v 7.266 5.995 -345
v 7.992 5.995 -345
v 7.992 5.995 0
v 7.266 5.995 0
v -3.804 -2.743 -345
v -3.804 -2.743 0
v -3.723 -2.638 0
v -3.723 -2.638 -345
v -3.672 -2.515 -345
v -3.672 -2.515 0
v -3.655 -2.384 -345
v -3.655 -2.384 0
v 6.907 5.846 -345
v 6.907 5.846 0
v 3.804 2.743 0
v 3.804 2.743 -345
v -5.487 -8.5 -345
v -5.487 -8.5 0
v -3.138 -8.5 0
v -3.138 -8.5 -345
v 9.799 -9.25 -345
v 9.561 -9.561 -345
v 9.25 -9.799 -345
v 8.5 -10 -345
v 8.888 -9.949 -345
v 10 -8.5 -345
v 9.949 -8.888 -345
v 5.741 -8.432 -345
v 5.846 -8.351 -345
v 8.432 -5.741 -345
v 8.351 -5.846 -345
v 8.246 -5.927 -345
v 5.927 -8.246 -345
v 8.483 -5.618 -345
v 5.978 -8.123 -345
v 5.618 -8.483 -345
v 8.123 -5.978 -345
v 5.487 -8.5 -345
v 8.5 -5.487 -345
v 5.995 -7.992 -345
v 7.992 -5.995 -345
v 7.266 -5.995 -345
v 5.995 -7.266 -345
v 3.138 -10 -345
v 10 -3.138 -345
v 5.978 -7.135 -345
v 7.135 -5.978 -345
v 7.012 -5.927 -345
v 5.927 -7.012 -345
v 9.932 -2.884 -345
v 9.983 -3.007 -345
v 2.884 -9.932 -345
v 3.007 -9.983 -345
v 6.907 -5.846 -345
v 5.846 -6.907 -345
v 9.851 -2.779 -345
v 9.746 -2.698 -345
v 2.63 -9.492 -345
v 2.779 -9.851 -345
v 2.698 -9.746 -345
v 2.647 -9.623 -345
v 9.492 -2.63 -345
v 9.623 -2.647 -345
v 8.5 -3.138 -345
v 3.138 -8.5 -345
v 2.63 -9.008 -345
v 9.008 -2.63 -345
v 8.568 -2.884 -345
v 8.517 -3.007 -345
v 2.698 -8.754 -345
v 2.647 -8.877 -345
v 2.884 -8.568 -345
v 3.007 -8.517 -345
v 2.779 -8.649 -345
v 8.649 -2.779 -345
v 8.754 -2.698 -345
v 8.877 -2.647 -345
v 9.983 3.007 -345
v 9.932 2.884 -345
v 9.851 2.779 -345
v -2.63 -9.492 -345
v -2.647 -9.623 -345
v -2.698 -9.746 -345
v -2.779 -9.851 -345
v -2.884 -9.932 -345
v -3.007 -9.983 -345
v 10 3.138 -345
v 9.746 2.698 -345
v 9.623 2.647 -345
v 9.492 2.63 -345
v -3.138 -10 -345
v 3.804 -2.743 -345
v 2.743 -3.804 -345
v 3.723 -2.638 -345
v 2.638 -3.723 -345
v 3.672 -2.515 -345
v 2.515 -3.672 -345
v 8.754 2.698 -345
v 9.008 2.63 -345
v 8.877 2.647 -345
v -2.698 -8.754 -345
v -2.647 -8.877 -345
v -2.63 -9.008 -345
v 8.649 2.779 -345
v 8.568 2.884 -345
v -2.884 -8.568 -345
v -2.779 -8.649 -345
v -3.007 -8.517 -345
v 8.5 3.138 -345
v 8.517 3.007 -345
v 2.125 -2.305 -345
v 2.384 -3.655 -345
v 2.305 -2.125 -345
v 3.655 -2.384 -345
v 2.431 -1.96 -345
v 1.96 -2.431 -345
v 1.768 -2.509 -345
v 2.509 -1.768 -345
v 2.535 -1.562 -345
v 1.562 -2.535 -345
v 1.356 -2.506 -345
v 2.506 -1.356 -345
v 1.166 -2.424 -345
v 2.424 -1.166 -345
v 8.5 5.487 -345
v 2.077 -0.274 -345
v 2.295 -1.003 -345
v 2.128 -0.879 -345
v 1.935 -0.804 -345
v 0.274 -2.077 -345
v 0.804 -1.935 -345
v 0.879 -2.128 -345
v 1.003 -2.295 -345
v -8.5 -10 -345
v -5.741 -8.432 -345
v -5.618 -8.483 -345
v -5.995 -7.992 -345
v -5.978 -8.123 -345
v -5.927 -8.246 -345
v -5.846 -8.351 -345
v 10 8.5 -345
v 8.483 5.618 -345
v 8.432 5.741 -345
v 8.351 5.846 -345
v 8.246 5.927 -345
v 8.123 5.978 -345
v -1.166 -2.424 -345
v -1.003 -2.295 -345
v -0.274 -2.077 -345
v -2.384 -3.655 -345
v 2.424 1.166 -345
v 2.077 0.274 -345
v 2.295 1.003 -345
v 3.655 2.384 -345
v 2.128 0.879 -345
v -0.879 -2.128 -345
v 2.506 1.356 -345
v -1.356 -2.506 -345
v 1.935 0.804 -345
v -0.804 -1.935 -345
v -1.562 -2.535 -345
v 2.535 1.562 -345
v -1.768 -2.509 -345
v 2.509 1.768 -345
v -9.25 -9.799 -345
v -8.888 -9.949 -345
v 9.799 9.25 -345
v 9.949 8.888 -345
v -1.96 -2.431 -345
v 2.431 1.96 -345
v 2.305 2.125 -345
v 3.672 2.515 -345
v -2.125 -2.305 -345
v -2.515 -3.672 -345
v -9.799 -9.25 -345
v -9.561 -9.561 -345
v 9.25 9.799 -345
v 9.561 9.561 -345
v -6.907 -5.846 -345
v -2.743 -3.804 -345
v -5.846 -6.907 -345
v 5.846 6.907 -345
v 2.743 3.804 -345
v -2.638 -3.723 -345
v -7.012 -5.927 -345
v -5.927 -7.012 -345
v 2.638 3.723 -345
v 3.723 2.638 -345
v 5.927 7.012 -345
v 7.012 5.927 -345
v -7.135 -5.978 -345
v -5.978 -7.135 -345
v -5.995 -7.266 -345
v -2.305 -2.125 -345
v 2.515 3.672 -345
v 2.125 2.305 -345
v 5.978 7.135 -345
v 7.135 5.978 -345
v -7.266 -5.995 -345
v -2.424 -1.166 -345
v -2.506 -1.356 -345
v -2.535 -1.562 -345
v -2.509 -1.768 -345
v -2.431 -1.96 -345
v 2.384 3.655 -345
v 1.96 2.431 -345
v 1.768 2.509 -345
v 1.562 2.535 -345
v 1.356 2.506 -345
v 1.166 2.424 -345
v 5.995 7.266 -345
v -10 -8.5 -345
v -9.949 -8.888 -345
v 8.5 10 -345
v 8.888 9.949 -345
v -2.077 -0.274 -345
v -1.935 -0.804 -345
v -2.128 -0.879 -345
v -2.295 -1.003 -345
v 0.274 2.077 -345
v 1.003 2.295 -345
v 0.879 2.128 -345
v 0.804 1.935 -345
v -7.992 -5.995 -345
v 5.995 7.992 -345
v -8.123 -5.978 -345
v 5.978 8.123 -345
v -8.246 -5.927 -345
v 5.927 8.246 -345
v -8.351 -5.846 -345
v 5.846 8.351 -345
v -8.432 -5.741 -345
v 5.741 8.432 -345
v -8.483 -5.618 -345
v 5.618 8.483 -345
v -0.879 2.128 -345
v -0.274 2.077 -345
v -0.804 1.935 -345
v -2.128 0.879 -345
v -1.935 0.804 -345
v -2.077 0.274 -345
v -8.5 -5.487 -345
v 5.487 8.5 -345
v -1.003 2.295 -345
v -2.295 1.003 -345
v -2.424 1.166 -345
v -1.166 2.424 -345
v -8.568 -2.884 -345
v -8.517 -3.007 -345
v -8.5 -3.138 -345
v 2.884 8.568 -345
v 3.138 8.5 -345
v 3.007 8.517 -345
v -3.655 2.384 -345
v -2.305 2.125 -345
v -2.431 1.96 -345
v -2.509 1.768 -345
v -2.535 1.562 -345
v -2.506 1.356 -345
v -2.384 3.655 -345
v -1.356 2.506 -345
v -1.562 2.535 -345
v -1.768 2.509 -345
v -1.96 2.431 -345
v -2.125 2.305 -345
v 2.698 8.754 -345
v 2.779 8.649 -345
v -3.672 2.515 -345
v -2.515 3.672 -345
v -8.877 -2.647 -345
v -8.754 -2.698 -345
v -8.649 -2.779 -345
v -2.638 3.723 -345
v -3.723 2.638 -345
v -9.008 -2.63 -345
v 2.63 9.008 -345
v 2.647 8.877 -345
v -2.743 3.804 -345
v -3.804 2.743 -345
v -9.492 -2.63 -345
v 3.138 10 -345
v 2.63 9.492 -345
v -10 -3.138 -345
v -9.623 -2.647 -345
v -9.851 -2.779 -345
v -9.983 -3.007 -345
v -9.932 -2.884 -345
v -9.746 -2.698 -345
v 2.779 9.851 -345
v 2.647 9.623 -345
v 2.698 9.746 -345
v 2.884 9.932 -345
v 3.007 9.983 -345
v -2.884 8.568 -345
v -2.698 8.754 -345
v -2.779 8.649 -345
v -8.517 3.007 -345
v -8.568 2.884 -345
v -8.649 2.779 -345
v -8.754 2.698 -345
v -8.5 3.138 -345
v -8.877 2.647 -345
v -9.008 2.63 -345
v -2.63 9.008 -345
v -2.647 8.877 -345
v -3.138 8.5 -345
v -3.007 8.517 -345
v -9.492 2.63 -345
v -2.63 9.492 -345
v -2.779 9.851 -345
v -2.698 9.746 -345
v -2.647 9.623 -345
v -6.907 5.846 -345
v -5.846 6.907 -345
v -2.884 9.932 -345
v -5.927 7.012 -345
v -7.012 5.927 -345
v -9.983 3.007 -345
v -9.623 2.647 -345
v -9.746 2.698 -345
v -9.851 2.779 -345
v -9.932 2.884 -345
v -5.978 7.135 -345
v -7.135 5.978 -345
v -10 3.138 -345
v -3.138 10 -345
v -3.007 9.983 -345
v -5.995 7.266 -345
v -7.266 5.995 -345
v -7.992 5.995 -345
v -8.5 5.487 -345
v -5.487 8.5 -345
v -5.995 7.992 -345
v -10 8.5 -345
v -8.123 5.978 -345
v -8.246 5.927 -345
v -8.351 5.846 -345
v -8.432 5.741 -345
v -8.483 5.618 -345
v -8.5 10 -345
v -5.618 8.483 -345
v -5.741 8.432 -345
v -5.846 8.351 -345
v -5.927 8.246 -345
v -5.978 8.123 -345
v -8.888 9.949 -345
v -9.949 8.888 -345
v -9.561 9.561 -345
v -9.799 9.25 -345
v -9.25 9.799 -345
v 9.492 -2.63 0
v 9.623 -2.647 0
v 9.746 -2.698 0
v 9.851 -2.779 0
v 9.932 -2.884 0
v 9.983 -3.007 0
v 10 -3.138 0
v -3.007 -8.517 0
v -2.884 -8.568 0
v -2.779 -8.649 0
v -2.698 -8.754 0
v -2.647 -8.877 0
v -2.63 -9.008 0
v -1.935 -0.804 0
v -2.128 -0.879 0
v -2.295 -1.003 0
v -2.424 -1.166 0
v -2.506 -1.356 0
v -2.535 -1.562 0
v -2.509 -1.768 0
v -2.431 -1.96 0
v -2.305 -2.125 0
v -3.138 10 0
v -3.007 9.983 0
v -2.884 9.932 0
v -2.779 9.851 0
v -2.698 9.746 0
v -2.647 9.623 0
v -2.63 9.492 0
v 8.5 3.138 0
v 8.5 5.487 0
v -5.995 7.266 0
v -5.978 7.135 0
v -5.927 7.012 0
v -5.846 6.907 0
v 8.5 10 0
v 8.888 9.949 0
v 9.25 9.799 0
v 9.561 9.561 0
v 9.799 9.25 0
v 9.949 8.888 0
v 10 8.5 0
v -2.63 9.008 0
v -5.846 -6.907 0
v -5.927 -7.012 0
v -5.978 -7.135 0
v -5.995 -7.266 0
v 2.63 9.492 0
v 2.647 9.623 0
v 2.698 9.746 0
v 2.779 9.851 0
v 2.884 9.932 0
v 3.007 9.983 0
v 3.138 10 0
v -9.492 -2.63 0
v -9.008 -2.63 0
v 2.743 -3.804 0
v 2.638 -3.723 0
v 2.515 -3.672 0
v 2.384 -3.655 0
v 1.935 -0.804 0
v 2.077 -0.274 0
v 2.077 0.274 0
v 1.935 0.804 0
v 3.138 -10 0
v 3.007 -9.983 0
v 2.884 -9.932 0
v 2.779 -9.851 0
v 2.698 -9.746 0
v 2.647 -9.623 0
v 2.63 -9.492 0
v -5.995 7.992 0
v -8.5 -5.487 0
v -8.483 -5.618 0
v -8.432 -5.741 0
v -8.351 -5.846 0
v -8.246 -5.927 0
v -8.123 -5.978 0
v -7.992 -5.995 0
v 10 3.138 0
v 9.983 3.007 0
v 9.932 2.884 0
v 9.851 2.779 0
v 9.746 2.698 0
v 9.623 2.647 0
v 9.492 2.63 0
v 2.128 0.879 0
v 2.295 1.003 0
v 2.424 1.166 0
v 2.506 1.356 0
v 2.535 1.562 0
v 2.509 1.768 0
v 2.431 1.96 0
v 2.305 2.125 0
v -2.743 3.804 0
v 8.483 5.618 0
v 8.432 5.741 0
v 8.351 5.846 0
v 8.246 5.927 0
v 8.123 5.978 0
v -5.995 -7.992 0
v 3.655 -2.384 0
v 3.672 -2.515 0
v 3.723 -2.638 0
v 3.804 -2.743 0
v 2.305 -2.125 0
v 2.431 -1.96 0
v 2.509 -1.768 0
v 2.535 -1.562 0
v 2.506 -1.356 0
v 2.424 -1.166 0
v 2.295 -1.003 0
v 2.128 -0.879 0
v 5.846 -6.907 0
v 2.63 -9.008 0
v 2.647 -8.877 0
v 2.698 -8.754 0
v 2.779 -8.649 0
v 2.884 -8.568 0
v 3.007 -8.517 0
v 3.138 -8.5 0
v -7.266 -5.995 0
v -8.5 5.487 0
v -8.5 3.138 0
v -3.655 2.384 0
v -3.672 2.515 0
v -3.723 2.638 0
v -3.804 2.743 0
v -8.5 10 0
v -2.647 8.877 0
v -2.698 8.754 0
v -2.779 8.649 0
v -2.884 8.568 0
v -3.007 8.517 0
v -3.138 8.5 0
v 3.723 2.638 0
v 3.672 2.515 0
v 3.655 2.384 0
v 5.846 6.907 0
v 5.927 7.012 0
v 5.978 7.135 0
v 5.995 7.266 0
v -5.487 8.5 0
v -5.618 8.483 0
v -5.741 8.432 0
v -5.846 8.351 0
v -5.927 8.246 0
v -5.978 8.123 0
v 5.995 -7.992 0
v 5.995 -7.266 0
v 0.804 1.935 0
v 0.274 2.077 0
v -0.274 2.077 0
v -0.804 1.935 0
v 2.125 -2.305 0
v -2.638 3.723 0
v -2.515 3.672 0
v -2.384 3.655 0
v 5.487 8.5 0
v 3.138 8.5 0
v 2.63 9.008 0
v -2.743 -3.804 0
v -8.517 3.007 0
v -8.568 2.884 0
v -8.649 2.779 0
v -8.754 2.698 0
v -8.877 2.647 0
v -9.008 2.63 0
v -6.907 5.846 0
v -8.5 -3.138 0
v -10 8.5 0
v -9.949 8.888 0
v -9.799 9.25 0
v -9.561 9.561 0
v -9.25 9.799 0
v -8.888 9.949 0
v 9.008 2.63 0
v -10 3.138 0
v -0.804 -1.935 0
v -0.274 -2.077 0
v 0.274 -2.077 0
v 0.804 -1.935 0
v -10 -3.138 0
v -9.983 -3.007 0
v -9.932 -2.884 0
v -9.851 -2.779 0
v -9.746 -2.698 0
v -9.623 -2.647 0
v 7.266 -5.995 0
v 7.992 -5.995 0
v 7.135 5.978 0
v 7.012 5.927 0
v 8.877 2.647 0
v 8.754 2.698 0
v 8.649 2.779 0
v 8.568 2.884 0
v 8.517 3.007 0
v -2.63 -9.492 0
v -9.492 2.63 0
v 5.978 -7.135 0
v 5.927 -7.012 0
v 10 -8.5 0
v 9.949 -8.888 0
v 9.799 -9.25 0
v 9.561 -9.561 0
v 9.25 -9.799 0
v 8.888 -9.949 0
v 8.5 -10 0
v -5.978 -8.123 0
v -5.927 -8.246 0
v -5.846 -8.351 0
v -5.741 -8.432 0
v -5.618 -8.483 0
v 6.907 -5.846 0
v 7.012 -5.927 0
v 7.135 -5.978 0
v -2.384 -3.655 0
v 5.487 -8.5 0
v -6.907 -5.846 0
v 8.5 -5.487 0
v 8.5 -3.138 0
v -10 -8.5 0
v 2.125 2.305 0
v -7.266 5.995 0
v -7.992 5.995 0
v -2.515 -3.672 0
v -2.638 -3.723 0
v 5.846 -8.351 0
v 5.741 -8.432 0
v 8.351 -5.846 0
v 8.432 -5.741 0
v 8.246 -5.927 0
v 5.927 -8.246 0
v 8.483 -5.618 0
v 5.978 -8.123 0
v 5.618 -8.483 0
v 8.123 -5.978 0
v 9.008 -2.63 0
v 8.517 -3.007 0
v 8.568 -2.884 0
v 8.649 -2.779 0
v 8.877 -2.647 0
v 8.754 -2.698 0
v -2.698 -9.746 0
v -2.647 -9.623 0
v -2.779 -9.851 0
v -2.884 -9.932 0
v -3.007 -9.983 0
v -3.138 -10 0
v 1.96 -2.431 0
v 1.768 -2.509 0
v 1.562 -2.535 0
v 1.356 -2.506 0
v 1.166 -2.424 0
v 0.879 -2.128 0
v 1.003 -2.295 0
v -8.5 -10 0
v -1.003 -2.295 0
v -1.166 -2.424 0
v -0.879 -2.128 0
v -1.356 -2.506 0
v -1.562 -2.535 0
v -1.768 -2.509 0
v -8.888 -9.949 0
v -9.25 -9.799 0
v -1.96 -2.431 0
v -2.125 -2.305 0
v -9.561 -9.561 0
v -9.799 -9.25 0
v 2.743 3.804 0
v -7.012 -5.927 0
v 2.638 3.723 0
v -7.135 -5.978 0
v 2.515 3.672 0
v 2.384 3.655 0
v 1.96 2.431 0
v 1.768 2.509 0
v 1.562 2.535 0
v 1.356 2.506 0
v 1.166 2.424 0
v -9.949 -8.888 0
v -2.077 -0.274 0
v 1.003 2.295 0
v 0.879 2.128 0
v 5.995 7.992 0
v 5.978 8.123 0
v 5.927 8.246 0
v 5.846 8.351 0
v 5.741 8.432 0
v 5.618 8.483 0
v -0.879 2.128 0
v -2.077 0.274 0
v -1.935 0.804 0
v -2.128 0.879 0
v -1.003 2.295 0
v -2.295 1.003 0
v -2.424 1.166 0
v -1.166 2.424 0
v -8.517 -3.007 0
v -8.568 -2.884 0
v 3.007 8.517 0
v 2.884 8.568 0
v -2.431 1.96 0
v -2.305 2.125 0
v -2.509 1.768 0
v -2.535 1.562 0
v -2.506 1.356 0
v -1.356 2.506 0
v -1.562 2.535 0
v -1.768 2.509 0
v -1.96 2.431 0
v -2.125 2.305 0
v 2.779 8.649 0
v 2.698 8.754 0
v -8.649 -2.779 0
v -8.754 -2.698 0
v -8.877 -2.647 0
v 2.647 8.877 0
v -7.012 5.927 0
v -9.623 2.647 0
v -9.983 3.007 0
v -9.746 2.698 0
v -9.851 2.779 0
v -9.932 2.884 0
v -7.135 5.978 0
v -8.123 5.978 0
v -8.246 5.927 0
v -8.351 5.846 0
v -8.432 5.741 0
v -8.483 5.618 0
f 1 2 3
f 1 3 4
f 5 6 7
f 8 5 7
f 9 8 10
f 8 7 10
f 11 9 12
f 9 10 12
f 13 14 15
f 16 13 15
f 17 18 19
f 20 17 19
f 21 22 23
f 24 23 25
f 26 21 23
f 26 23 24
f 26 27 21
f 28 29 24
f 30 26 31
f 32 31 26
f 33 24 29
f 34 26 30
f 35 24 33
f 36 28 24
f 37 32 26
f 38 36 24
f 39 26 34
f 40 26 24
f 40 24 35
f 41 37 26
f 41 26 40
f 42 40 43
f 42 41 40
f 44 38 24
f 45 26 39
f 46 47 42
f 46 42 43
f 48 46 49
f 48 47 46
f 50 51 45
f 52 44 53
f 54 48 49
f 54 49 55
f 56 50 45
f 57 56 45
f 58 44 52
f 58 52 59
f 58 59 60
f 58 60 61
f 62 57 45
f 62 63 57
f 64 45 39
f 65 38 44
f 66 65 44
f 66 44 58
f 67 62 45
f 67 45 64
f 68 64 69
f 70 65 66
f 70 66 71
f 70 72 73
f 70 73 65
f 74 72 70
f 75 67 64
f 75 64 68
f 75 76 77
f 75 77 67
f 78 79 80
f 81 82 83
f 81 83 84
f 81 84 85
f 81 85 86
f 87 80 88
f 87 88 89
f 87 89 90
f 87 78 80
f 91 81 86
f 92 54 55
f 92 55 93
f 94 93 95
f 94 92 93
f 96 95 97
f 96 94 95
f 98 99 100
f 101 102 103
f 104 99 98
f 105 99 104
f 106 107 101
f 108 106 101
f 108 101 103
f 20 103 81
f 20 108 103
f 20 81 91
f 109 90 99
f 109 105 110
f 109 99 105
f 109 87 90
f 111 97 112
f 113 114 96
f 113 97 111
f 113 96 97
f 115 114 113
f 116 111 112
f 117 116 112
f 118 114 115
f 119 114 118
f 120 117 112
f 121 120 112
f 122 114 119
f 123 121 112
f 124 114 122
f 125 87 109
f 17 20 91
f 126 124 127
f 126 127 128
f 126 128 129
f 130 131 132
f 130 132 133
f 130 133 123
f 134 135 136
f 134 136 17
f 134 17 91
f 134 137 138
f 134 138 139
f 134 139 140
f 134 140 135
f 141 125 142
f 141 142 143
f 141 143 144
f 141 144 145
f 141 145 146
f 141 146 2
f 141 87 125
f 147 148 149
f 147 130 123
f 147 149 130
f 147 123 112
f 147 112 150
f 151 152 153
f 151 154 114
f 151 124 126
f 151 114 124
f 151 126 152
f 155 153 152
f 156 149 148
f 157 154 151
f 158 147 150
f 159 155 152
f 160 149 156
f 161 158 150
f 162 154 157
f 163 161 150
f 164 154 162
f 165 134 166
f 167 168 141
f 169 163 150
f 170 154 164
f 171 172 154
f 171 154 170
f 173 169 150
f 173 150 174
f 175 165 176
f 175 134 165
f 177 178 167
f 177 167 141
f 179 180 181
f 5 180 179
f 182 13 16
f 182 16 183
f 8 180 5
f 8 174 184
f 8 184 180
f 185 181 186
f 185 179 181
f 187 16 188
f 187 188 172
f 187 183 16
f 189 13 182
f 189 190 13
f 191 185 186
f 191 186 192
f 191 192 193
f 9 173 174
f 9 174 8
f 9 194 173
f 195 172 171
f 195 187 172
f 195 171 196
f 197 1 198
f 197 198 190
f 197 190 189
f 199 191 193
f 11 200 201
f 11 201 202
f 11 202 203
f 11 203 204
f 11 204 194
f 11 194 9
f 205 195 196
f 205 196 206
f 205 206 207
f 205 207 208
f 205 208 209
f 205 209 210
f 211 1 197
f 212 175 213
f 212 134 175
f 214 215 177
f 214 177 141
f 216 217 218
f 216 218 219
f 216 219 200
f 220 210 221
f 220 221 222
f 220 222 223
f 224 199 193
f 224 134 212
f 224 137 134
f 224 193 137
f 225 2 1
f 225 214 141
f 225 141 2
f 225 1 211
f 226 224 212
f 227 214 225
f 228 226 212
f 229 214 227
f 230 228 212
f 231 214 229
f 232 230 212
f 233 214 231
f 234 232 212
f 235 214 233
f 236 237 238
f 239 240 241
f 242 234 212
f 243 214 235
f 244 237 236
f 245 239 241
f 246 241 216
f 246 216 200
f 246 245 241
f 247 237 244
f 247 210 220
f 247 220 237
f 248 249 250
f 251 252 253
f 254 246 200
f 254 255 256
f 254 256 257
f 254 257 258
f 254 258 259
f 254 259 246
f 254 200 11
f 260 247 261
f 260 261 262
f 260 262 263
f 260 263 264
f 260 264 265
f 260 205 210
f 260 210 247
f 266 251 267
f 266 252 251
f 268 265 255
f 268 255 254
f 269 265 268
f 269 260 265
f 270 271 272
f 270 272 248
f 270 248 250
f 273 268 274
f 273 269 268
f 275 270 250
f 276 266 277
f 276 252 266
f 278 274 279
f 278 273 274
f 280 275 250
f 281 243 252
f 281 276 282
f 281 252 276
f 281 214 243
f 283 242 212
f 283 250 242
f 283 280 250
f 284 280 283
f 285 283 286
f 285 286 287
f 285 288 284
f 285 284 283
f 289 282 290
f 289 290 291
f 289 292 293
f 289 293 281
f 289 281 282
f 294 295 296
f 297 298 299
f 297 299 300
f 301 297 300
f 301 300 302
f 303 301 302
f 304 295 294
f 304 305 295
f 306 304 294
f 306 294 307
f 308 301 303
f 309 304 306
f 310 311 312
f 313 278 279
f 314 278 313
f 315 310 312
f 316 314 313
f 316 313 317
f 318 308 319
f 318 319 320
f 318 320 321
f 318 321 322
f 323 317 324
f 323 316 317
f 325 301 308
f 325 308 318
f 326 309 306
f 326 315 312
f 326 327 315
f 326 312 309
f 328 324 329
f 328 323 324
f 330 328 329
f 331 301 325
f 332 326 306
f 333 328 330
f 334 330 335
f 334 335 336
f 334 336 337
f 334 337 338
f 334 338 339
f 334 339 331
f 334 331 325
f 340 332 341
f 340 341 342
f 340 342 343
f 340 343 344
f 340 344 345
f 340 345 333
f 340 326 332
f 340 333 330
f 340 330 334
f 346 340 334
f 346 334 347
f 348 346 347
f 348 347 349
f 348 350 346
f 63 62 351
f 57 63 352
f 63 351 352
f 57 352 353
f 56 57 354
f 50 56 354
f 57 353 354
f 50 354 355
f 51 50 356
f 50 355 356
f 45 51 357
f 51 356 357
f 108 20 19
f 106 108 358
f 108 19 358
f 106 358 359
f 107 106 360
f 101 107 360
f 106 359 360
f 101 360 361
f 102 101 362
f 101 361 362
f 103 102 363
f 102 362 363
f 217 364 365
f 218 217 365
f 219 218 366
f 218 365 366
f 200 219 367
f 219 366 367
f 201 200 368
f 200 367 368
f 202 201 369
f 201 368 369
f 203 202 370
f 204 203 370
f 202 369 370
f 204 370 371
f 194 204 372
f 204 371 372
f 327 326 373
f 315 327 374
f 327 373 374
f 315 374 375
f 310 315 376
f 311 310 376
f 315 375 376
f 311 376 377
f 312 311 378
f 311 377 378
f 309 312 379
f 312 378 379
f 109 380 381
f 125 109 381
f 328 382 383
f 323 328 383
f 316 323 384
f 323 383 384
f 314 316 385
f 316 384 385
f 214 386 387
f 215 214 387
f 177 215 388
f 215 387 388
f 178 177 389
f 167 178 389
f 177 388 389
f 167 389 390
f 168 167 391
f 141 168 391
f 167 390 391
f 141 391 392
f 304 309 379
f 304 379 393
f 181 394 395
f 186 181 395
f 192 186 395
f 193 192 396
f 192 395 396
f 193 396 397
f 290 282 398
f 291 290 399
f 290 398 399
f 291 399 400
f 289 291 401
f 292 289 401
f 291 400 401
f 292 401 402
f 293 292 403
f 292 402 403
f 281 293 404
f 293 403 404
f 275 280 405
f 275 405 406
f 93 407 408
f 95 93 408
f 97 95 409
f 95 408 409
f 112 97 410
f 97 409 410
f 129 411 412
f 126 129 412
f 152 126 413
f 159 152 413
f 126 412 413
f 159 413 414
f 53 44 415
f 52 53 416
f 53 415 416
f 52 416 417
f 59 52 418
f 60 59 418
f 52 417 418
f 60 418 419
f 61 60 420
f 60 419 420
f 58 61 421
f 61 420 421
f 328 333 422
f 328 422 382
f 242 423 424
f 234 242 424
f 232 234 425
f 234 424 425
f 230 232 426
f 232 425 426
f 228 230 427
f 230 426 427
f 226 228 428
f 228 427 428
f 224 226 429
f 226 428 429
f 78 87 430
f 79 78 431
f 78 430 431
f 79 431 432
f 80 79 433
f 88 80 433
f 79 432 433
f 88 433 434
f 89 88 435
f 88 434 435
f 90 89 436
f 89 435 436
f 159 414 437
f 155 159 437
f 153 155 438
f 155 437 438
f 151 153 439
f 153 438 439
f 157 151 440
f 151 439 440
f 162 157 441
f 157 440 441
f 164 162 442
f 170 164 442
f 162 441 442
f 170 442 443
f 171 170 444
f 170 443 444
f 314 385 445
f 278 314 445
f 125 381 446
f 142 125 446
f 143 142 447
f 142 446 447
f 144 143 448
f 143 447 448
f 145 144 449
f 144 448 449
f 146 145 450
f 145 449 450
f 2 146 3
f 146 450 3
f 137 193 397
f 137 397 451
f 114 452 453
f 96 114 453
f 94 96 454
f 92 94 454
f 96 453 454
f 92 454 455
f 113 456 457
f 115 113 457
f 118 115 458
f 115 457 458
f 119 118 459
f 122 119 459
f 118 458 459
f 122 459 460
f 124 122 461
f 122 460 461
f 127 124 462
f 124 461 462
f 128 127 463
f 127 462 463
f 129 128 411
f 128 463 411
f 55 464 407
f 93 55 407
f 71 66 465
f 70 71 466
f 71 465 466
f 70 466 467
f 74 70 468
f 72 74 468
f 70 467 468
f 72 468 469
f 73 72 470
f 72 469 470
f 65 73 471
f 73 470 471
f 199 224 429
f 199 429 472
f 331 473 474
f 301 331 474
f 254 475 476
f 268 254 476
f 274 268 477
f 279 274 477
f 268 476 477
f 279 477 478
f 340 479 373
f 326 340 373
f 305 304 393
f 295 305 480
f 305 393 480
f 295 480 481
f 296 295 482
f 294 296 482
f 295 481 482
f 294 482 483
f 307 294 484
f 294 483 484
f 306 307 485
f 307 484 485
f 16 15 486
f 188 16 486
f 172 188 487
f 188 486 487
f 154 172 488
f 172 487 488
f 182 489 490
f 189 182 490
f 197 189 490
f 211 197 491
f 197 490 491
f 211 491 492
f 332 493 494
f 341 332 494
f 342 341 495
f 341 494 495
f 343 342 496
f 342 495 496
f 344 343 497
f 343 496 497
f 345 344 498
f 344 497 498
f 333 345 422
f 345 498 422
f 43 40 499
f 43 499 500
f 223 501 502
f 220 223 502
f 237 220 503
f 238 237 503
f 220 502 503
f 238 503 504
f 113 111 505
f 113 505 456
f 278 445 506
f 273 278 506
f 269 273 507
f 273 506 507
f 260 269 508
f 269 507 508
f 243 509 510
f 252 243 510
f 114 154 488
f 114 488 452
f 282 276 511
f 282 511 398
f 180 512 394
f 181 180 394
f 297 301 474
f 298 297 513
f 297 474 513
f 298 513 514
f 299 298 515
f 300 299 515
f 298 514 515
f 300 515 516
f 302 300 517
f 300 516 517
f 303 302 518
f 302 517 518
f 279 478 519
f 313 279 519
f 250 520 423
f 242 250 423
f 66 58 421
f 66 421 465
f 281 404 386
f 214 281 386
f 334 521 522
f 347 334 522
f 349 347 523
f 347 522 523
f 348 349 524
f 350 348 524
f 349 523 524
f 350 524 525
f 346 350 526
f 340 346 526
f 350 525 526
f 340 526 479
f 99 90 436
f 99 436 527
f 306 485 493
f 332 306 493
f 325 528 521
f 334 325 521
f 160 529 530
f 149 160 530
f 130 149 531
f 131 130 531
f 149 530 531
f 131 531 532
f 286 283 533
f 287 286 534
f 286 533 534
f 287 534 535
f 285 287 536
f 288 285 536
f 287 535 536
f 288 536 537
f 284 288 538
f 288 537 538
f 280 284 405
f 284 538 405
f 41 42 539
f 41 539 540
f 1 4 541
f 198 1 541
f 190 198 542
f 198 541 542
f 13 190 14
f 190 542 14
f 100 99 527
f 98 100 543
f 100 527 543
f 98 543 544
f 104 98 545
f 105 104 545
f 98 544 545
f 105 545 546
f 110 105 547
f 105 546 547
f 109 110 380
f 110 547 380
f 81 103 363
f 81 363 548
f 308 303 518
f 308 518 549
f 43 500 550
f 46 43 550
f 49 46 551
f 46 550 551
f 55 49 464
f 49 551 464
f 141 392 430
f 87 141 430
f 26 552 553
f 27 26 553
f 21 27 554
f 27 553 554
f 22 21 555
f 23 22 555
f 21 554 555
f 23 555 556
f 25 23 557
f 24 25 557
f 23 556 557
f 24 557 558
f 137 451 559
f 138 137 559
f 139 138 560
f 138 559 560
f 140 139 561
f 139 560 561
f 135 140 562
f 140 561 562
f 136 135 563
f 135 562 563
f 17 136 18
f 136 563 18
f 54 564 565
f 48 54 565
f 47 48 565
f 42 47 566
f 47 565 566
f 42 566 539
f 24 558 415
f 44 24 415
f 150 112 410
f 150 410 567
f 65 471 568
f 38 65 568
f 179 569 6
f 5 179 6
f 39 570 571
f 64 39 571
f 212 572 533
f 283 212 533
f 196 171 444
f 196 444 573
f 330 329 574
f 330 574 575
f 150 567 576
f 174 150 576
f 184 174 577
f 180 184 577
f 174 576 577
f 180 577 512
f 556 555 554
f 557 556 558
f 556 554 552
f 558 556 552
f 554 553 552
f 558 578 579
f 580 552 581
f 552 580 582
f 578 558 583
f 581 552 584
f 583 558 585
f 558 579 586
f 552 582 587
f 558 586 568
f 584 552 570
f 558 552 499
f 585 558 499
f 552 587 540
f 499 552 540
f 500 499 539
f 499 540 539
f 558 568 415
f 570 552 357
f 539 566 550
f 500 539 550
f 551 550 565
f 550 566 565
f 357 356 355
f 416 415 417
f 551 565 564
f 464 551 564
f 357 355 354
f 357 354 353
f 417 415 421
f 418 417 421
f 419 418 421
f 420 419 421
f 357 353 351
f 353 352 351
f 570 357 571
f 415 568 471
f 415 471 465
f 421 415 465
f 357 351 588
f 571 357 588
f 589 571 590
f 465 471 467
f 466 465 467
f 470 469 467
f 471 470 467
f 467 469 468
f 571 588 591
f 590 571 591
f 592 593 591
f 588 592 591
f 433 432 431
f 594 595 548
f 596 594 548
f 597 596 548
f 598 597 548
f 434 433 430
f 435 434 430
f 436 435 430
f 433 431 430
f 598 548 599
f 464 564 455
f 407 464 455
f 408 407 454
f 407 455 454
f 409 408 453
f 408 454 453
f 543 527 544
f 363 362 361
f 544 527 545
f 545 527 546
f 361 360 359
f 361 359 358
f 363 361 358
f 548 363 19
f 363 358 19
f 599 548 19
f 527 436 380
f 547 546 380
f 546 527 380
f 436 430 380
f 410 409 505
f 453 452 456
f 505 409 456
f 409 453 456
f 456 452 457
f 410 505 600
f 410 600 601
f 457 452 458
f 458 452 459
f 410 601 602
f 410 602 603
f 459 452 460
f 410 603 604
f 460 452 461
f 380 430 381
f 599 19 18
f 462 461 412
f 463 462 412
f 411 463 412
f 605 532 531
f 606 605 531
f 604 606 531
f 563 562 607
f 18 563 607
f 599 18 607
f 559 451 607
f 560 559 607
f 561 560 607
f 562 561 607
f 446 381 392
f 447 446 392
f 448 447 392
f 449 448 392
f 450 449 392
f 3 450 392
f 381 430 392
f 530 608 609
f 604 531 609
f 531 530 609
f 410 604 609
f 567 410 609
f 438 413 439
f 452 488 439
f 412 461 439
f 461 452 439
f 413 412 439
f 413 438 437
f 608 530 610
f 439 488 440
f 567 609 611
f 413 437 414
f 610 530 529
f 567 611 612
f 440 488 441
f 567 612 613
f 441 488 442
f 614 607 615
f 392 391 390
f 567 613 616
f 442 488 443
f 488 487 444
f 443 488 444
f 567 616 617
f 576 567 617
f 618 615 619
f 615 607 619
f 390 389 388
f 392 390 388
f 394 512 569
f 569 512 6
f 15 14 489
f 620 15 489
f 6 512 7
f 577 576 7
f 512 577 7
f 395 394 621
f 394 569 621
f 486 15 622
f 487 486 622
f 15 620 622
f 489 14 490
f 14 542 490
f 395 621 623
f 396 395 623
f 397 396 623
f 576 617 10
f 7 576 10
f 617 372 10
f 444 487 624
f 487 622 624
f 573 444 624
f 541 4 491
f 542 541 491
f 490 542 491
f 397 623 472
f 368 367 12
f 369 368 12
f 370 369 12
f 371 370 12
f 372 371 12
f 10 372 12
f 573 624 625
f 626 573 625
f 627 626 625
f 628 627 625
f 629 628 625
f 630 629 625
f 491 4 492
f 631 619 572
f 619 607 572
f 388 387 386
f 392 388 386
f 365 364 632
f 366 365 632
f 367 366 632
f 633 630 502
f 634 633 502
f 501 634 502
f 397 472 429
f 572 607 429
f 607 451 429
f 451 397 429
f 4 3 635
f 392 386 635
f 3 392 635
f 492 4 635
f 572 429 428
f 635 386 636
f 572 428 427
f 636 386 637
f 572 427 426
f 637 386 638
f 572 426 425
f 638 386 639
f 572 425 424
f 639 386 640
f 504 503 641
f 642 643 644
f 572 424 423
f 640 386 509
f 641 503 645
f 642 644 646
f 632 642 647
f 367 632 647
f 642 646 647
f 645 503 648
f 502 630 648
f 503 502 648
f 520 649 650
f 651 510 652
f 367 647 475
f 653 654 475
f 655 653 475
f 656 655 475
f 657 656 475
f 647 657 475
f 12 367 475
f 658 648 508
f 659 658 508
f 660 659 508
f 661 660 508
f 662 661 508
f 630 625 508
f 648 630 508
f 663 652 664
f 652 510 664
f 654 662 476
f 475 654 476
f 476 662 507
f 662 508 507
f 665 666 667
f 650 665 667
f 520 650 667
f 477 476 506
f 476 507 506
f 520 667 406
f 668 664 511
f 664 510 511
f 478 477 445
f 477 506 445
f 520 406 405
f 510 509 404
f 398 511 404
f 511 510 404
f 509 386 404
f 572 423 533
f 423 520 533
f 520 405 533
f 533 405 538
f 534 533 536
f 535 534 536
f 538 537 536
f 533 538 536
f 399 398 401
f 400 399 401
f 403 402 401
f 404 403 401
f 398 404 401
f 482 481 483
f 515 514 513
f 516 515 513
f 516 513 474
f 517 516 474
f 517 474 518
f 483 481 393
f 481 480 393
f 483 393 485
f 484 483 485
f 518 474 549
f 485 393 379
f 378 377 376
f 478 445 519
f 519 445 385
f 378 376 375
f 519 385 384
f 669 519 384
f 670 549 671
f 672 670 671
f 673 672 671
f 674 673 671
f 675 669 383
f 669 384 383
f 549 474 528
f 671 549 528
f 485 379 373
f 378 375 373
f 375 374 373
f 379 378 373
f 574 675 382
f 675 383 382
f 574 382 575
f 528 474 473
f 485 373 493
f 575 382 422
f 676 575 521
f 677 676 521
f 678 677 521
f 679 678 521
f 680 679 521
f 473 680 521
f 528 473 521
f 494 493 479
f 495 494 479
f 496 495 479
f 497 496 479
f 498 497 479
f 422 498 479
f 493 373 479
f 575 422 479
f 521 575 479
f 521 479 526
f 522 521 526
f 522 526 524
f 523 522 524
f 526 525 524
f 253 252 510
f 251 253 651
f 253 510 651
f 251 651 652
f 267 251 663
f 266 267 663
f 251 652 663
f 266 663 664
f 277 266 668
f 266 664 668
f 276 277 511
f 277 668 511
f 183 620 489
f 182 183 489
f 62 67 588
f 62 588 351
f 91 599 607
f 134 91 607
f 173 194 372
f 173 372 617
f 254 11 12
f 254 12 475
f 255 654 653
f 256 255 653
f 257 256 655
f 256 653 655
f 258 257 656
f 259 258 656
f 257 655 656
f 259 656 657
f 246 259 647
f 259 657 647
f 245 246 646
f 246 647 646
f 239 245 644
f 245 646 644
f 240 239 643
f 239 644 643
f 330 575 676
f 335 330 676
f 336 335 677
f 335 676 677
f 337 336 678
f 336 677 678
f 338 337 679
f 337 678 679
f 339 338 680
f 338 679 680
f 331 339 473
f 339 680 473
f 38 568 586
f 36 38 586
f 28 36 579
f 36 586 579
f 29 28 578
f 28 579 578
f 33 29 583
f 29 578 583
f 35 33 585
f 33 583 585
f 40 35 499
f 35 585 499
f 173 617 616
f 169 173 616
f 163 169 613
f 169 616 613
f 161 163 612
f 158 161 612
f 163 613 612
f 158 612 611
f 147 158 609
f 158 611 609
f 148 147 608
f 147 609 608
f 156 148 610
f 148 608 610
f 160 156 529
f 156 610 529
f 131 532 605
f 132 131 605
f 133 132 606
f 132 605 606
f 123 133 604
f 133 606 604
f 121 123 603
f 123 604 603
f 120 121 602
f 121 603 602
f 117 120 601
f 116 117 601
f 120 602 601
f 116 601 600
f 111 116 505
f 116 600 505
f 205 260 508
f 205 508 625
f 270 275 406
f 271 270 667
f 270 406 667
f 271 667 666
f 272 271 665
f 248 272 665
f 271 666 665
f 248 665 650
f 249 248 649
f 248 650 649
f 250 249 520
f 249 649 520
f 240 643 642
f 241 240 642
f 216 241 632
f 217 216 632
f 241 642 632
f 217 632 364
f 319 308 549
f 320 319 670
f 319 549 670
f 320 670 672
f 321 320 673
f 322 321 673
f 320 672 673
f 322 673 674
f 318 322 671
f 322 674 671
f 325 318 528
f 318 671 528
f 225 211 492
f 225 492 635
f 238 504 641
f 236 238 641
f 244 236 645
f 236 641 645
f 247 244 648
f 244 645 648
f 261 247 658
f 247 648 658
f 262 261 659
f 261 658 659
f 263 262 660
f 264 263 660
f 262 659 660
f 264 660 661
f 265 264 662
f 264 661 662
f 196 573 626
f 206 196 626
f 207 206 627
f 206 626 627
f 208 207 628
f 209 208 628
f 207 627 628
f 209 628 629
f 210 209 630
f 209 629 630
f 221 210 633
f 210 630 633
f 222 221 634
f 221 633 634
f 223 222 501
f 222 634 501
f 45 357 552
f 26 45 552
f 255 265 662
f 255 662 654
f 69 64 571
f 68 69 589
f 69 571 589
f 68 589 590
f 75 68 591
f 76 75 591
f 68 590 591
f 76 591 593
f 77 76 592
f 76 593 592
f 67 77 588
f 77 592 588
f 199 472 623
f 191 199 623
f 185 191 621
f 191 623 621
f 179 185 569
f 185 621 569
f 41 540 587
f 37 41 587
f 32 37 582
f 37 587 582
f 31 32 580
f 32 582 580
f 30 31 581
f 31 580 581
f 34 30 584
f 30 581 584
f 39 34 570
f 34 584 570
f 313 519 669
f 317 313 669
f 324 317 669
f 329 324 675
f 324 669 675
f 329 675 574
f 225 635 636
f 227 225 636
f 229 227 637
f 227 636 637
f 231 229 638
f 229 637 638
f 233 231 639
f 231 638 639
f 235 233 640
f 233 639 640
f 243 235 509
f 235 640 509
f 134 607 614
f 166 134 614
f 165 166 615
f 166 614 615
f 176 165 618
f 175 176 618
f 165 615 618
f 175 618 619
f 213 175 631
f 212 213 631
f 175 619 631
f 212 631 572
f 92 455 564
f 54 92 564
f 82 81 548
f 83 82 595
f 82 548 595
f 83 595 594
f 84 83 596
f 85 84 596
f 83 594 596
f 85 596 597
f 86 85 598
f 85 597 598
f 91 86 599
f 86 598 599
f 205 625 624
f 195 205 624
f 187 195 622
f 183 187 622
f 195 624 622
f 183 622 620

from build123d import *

# Parameters (mm, degrees)
EXTRUDE1_DEPTH = 345


with BuildPart() as part:
    # Sketch1 → Extrude1 (new body)
    with BuildSketch(Plane.XY):
        with BuildLine():
            Line((9.492, 2.63), (9.008, 2.63))
            ThreePointArc((9.008, 2.63), (8.648789755, 2.778789755), (8.5, 3.138))
            Line((8.5, 3.138), (8.5, 5.487))
            ThreePointArc((8.5, 5.487), (8.351210245, 5.846210245), (7.992, 5.995))
            Line((7.992, 5.995), (7.266080661, 5.995))
            ThreePointArc((7.266080661, 5.995), (7.071677478, 5.956330803), (6.906870417, 5.846210245))
            Line((6.906870417, 5.846210245), (3.803789755, 2.743129583))
            ThreePointArc((3.803789755, 2.743129583), (3.693669197, 2.578322522), (3.655, 2.383919339))
            Line((3.655, 2.383919339), (3.655, -2.383919339))
            ThreePointArc((3.655, -2.383919339), (3.693669197, -2.578322522), (3.803789755, -2.743129583))
            Line((3.803789755, -2.743129583), (6.906870417, -5.846210245))
            ThreePointArc((6.906870417, -5.846210245), (7.071677478, -5.956330803), (7.266080661, -5.995))
            Line((7.266080661, -5.995), (7.992, -5.995))
            ThreePointArc((7.992, -5.995), (8.351210245, -5.846210245), (8.5, -5.487))
            Line((8.5, -5.487), (8.5, -3.138))
            ThreePointArc((8.5, -3.138), (8.648789755, -2.778789755), (9.008, -2.63))
            Line((9.008, -2.63), (9.492, -2.63))
            ThreePointArc((9.492, -2.63), (9.851210245, -2.778789755), (10, -3.138))
            Line((10, -3.138), (10, -8.5))
            ThreePointArc((10, -8.5), (9.560660172, -9.560660172), (8.5, -10))
            Line((8.5, -10), (3.138, -10))
            ThreePointArc((3.138, -10), (2.778789755, -9.851210245), (2.63, -9.492))
            Line((2.63, -9.492), (2.63, -9.008))
            ThreePointArc((2.63, -9.008), (2.778789755, -8.648789755), (3.138, -8.5))
            Line((3.138, -8.5), (5.487, -8.5))
            ThreePointArc((5.487, -8.5), (5.846210245, -8.351210245), (5.995, -7.992))
            Line((5.995, -7.992), (5.995, -7.266080661))
            ThreePointArc((5.995, -7.266080661), (5.956330803, -7.071677478), (5.846210245, -6.906870417))
            Line((5.846210245, -6.906870417), (2.743129583, -3.803789755))
            ThreePointArc((2.743129583, -3.803789755), (2.578322522, -3.693669197), (2.383919339, -3.655))
            Line((2.383919339, -3.655), (-2.383919339, -3.655))
            ThreePointArc((-2.383919339, -3.655), (-2.578322522, -3.693669197), (-2.743129583, -3.803789755))
            Line((-2.743129583, -3.803789755), (-5.846210245, -6.906870417))
            ThreePointArc((-5.846210245, -6.906870417), (-5.956330803, -7.071677478), (-5.995, -7.266080661))
            Line((-5.995, -7.266080661), (-5.995, -7.992))
            ThreePointArc((-5.995, -7.992), (-5.846210245, -8.351210245), (-5.487, -8.5))
            Line((-5.487, -8.5), (-3.138, -8.5))
            ThreePointArc((-3.138, -8.5), (-2.778789755, -8.648789755), (-2.63, -9.008))
            Line((-2.63, -9.008), (-2.63, -9.492))
            ThreePointArc((-2.63, -9.492), (-2.778789755, -9.851210245), (-3.138, -10))
            Line((-3.138, -10), (-8.5, -10))
            ThreePointArc((-8.5, -10), (-9.560660172, -9.560660172), (-10, -8.5))
            Line((-10, -8.5), (-10, -3.138))
            ThreePointArc((-10, -3.138), (-9.851210245, -2.778789755), (-9.492, -2.63))
            Line((-9.492, -2.63), (-9.008, -2.63))
            ThreePointArc((-9.008, -2.63), (-8.648789755, -2.778789755), (-8.5, -3.138))
            Line((-8.5, -3.138), (-8.5, -5.487))
            ThreePointArc((-8.5, -5.487), (-8.351210245, -5.846210245), (-7.992, -5.995))
            Line((-7.992, -5.995), (-7.266080661, -5.995))
            ThreePointArc((-7.266080661, -5.995), (-7.071677478, -5.956330803), (-6.906870417, -5.846210245))
            Line((-6.906870417, -5.846210245), (-3.803789755, -2.743129583))
            ThreePointArc((-3.803789755, -2.743129583), (-3.693669197, -2.578322522), (-3.655, -2.383919339))
            Line((-3.655, -2.383919339), (-3.655, 2.383919339))
            ThreePointArc((-3.655, 2.383919339), (-3.693669197, 2.578322522), (-3.803789755, 2.743129583))
            Line((-3.803789755, 2.743129583), (-6.906870417, 5.846210245))
            ThreePointArc((-6.906870417, 5.846210245), (-7.071677478, 5.956330803), (-7.266080661, 5.995))
            Line((-7.266080661, 5.995), (-7.992, 5.995))
            ThreePointArc((-7.992, 5.995), (-8.351210245, 5.846210245), (-8.5, 5.487))
            Line((-8.5, 5.487), (-8.5, 3.138))
            ThreePointArc((-8.5, 3.138), (-8.648789755, 2.778789755), (-9.008, 2.63))
            Line((-9.008, 2.63), (-9.492, 2.63))
            ThreePointArc((-9.492, 2.63), (-9.851210245, 2.778789755), (-10, 3.138))
            Line((-10, 3.138), (-10, 8.5))
            ThreePointArc((-10, 8.5), (-9.560660172, 9.560660172), (-8.5, 10))
            Line((-8.5, 10), (-3.138, 10))
            ThreePointArc((-3.138, 10), (-2.778789755, 9.851210245), (-2.63, 9.492))
            Line((-2.63, 9.492), (-2.63, 9.008))
            ThreePointArc((-2.63, 9.008), (-2.778789755, 8.648789755), (-3.138, 8.5))
            Line((-3.138, 8.5), (-5.487, 8.5))
            ThreePointArc((-5.487, 8.5), (-5.846210245, 8.351210245), (-5.995, 7.992))
            Line((-5.995, 7.992), (-5.995, 7.266080661))
            ThreePointArc((-5.995, 7.266080661), (-5.956330803, 7.071677478), (-5.846210245, 6.906870417))
            Line((-5.846210245, 6.906870417), (-2.743129583, 3.803789755))
            ThreePointArc((-2.743129583, 3.803789755), (-2.578322522, 3.693669197), (-2.383919339, 3.655))
            Line((-2.383919339, 3.655), (2.383919339, 3.655))
            ThreePointArc((2.383919339, 3.655), (2.578322522, 3.693669197), (2.743129583, 3.803789755))
            Line((2.743129583, 3.803789755), (5.846210245, 6.906870417))
            ThreePointArc((5.846210245, 6.906870417), (5.956330803, 7.071677478), (5.995, 7.266080661))
            Line((5.995, 7.266080661), (5.995, 7.992))
            ThreePointArc((5.995, 7.992), (5.846210245, 8.351210245), (5.487, 8.5))
            Line((5.487, 8.5), (3.138, 8.5))
            ThreePointArc((3.138, 8.5), (2.778789755, 8.648789755), (2.63, 9.008))
            Line((2.63, 9.008), (2.63, 9.492))
            ThreePointArc((2.63, 9.492), (2.778789755, 9.851210245), (3.138, 10))
            Line((3.138, 10), (8.5, 10))
            ThreePointArc((8.5, 10), (9.560660172, 9.560660172), (10, 8.5))
            Line((10, 8.5), (10, 3.138))
            ThreePointArc((10, 3.138), (9.851210245, 2.778789755), (9.492, 2.63))
        make_face()
        with BuildLine():
            Line((2.124900844, -2.304505966), (2.304505966, -2.124900844))
            ThreePointArc((2.304505966, -2.124900844), (2.505938017, -1.356467811), (1.935133506, -0.803976718))
            ThreePointArc((1.935133506, -0.803976718), (2.0955, 0), (1.935133506, 0.803976718))
            ThreePointArc((1.935133506, 0.803976718), (2.505938017, 1.356467811), (2.304505966, 2.124900844))
            Line((2.304505966, 2.124900844), (2.124900844, 2.304505966))
            ThreePointArc((2.124900844, 2.304505966), (1.356467811, 2.505938017), (0.803976718, 1.935133506))
            ThreePointArc((0.803976718, 1.935133506), (0, 2.0955), (-0.803976718, 1.935133506))
            ThreePointArc((-0.803976718, 1.935133506), (-1.356467811, 2.505938017), (-2.124900844, 2.304505966))
            Line((-2.124900844, 2.304505966), (-2.304505966, 2.124900844))
            ThreePointArc((-2.304505966, 2.124900844), (-2.505938017, 1.356467811), (-1.935133506, 0.803976718))
            ThreePointArc((-1.935133506, 0.803976718), (-2.0955, 0), (-1.935133506, -0.803976718))
            ThreePointArc((-1.935133506, -0.803976718), (-2.505938017, -1.356467811), (-2.304505966, -2.124900844))
            Line((-2.304505966, -2.124900844), (-2.124900844, -2.304505966))
            ThreePointArc((-2.124900844, -2.304505966), (-1.356467811, -2.505938017), (-0.803976718, -1.935133506))
            ThreePointArc((-0.803976718, -1.935133506), (0, -2.0955), (0.803976718, -1.935133506))
            ThreePointArc((0.803976718, -1.935133506), (1.356467811, -2.505938017), (2.124900844, -2.304505966))
        make_face(mode=Mode.SUBTRACT)
    extrude(amount=-EXTRUDE1_DEPTH)


solid = part.part
